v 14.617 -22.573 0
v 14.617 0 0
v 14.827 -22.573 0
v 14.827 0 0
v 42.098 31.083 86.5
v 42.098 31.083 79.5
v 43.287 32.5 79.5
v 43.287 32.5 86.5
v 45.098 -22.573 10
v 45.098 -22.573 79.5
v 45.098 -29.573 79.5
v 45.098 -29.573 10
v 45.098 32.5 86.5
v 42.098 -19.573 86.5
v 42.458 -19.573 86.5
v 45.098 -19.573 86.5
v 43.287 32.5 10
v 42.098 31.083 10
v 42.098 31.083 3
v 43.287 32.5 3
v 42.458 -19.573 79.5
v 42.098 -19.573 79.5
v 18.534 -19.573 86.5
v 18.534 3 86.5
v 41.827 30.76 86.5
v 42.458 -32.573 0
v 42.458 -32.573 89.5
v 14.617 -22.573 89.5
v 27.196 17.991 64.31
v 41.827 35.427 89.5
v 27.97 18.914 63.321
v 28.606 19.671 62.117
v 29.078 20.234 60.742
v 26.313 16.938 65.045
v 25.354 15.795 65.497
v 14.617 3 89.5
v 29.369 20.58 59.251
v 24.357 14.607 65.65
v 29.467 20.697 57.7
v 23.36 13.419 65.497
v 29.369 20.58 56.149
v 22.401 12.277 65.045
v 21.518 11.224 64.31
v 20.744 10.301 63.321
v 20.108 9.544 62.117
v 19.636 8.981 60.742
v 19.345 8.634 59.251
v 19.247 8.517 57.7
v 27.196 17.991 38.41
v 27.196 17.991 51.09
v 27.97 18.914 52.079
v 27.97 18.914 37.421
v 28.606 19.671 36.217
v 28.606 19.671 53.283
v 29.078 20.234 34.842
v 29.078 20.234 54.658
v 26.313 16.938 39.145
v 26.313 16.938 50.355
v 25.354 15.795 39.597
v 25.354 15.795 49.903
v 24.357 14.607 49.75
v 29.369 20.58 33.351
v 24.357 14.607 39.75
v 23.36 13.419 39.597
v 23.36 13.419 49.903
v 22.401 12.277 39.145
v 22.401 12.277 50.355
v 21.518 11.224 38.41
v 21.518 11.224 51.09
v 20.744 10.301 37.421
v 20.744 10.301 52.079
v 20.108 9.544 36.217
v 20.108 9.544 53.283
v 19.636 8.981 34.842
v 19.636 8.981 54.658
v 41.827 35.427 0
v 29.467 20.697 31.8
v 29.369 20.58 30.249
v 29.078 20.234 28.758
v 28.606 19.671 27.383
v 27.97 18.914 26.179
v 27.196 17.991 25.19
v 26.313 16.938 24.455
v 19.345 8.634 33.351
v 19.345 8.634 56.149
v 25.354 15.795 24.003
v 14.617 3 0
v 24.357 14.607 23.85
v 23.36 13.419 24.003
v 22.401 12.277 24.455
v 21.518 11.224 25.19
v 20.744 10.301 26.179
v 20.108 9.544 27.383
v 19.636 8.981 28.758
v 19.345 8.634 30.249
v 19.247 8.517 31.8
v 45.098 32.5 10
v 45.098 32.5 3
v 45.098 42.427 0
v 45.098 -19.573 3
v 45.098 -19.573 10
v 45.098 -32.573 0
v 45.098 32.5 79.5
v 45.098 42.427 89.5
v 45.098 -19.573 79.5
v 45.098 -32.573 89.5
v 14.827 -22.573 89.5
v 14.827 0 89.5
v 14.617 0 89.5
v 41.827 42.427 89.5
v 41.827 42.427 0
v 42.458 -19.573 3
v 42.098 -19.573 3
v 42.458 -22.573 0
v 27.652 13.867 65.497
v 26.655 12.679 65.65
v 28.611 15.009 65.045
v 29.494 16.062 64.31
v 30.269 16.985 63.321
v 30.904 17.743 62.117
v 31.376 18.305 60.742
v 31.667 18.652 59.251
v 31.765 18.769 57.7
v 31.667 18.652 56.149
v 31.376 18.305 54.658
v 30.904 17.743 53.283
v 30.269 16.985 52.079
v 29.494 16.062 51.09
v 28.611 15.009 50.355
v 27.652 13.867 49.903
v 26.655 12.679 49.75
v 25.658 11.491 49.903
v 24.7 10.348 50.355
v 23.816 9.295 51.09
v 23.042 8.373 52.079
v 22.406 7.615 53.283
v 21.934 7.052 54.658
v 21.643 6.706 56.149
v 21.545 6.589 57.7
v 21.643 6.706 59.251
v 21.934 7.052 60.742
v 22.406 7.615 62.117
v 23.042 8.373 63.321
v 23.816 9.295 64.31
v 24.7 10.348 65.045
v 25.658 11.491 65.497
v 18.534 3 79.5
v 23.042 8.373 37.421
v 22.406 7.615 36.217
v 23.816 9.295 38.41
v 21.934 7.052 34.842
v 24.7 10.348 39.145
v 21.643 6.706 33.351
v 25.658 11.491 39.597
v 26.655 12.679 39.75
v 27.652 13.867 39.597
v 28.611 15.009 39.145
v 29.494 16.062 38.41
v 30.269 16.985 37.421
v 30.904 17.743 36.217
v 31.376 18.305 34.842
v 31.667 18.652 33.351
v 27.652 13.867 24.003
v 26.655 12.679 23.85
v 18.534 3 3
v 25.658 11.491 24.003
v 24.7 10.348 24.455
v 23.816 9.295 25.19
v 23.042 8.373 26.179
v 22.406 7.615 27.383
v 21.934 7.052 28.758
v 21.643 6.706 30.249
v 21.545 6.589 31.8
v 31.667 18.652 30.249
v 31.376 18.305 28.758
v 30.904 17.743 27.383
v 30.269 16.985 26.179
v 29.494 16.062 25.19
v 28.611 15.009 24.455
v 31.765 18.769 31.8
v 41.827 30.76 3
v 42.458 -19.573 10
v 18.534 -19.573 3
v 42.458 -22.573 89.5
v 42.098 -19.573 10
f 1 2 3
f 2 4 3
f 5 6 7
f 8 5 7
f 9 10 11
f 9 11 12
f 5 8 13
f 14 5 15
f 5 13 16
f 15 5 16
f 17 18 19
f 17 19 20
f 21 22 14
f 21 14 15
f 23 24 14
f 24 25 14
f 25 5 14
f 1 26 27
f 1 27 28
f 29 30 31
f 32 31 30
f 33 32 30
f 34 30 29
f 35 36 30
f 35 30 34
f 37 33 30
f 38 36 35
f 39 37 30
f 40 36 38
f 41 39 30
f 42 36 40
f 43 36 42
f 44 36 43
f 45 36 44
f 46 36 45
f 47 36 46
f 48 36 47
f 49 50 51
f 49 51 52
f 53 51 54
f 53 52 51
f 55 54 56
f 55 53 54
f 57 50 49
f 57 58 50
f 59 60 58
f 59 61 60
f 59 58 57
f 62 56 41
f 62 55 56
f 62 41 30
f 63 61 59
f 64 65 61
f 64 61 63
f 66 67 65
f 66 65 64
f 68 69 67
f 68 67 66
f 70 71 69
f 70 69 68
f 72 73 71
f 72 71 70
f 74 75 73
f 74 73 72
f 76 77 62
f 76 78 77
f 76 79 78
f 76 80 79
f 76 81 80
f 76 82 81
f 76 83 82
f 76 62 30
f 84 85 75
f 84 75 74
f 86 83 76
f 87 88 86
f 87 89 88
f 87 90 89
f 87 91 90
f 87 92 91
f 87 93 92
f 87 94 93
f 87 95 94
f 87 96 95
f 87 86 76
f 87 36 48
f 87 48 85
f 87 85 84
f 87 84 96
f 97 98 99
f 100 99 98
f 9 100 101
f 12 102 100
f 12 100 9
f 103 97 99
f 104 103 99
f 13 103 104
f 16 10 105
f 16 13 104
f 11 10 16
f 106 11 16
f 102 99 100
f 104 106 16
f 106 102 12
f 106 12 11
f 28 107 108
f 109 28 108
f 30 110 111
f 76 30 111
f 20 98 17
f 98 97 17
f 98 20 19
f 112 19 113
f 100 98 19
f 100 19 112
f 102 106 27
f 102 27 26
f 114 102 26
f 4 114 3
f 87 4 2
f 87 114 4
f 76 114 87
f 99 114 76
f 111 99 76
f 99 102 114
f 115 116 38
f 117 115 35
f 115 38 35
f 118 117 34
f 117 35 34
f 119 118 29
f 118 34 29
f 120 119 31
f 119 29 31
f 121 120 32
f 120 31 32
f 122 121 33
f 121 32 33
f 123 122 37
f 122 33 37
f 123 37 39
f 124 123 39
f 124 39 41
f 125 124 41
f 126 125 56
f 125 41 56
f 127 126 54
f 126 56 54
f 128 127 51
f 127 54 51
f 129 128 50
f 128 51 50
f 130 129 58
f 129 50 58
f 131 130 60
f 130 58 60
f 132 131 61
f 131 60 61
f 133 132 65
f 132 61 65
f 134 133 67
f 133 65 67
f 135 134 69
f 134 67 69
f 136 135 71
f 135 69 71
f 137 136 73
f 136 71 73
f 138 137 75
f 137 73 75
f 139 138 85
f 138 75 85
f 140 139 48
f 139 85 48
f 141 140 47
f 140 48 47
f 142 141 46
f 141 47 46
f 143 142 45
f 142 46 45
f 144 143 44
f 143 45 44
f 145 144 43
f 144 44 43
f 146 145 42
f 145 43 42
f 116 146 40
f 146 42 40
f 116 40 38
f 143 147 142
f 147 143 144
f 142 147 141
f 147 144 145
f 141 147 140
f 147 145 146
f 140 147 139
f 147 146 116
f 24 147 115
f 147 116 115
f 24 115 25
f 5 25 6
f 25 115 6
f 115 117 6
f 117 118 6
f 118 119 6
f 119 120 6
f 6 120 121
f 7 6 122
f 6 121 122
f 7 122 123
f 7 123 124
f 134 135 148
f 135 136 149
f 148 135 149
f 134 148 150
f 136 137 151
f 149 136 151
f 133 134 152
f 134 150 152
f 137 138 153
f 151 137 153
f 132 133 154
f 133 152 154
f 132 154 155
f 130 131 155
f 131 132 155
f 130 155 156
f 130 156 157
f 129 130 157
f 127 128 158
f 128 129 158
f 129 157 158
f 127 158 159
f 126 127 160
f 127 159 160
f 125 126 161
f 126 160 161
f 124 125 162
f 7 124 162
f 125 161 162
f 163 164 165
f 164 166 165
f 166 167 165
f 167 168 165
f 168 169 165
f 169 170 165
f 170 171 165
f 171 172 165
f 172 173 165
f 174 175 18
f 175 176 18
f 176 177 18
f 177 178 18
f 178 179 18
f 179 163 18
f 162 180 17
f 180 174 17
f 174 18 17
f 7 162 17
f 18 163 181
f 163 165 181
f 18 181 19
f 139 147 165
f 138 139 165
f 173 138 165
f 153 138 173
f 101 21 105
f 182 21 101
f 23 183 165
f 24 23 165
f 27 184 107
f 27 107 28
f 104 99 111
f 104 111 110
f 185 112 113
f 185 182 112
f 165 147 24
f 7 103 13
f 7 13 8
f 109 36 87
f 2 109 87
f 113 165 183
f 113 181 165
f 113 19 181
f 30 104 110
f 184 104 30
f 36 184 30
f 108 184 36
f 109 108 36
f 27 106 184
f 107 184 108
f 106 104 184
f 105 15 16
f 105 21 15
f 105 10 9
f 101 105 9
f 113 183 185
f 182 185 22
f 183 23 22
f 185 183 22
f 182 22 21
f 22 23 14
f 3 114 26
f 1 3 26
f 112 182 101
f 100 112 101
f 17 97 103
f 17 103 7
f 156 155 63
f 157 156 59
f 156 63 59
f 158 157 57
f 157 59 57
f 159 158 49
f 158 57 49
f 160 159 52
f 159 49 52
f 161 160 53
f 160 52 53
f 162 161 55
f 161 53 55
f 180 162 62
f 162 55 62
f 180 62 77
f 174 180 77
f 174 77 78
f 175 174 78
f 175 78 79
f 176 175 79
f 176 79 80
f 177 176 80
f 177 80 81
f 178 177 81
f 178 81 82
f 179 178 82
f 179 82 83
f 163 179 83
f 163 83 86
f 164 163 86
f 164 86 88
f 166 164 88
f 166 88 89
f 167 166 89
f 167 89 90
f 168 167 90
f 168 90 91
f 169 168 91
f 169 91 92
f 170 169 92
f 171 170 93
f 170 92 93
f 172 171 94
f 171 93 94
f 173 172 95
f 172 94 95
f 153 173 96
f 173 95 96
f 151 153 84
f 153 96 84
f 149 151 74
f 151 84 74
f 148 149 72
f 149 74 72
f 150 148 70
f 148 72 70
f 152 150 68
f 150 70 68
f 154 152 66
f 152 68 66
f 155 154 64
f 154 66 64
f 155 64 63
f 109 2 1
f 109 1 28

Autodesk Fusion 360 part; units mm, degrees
sketch "Boceto1" plane through (0, 0, 0) normal (0, 1, 0) x (1, 0, 0)
  line L0 (0, 0) -> (45.0979, 0)
  line L1 (45.0979, 0) -> (45.0979, -89.5)
  line L2 (45.0979, -89.5) -> (0, -89.5)
  line L3 (0, -89.5) -> (0, 0)
  dimension "d1" = 89.5
extrude "Extruir1" add sketch "Boceto1" along normal blind 3
sketch "Boceto2" plane through (0, 0, 0) normal (0, -1, 0) x (1, 0, 0)
  line L0 (45.0979, 89.5) -> (0, 89.5)
  line L1 (0, 89.5) -> (0, 0)
  line L2 (0, 0) -> (45.0979, 0)
  line L3 (45.0979, 0) -> (45.0979, 89.5)
  line L4 (0, 0) -> (12.1, 0)
  line L5 (12.1, 89.5) -> (0, 89.5)
  line L6 (0, 89.5) -> (0, 0)
  point P0 (12.1, 0)
  point P1 (12.1, 89.5)
ref_plane "PlanoDeObra1" through (12.1, 0, 44.75) normal (-0.7071, 0.7071, 0) x (0, 0, -1)
sketch "Boceto3" plane through (45.0979, 0, 0) normal (1, 0, 0) x (0, 0, -1)
  line L0 (-89.5, 0) -> (0, 0)
  line L1 (0, 0) -> (0, 3)
  line L2 (0, 3) -> (-89.5, 3)
  line L3 (-89.5, 3) -> (-89.5, 0)
  line L4 (0, 0) -> (-89.5, 0)
  line L5 (-89.5, 0) -> (-89.5, 35.5)
  line L6 (-89.5, 35.5) -> (0, 35.5)
  line L7 (0, 35.5) -> (0, 0)
  line L8 (-86.5, 3) -> (-86.5, 32.5)
  line L9 (-86.5, 32.5) -> (-3, 32.5)
  line L10 (-3, 32.5) -> (-3, 3)
  line L11 (-3, 3) -> (-86.5, 3)
  dimension "d6" = 89.5
  dimension "d7" = 35.5
  dimension "d8" = 3
extrude "Extruir2" add sketch "Boceto3" against normal blind 3 contours L2 L5 L6 L7 L8 L9 L10
sketch "Boceto4" plane through (6.05, -6.05, 0) normal (-0.7071, 0.7071, 0) x (0, 0, -1)
ref_plane "PlanoDeObra2" through (12.1, 0, 44.75) normal (-0.766, 0.6428, 0) x (0, 0, -1)
sketch "Boceto5" plane through (7.1006, -5.9581, 0) normal (-0.766, 0.6428, 0) x (0, 0, -1)
  line L0 (-89.5, -7.7775) -> (0, -7.7775)
  line L1 (0, -7.7775) -> (0, -54.0244)
  line L2 (0, -54.0244) -> (-89.5, -54.0244)
  line L3 (-89.5, -54.0244) -> (-89.5, -7.7775)
  dimension "d12" = 89.5
extrude "Extruir3" add sketch "Boceto5" against normal blind 3
extrude "Extruir4" cut sketch "Boceto2" along normal blind 3
sketch "Boceto6" plane through (7.1006, -5.9581, 0) normal (-0.766, 0.6428, 0) x (0, 0, 1)
  line L0 (0, 11.694) -> (89.5, 11.694)
  line L1 (89.5, 11.694) -> (89.5, 54.0244)
  line L2 (89.5, 54.0244) -> (0, 54.0244)
  line L3 (0, 54.0244) -> (0, 11.694)
  circle A0 centre (57.7, 26.8462) radius 7.95
  circle A1 centre (31.8, 26.8462) radius 7.95
  dimension "d18" = 15.9
  dimension "d19" = 25.9
  dimension "d20" = 15.9
extrude "Extruir5" cut sketch "Boceto6" against normal blind 3 contours A0 | A1
sketch "Boceto7" plane through (0, 3, 0) normal (0, 1, 0) x (-1, 0, 0)
  line L0 (-14.6173, 89.5) -> (-14.6173, 0)
  line L1 (-14.6173, 0) -> (0, 0)
  line L2 (0, 0) -> (0, 89.5)
  line L3 (0, 89.5) -> (-14.6173, 89.5)
  circle A0 centre (-8, 5) radius 3.25
  circle A1 centre (-7.3086, 84.9016) radius 3.25
  dimension "d23" = 6.5
  dimension "d24" = 6.5
extrude "Extruir6" cut sketch "Boceto7" against normal blind 3 contours A0 | A1
sketch "Boceto8" plane through (0, 0, 89.5) normal (0, 0, 1) x (1, 0, 0)
  line L0 (18.5335, 3) -> (42.0979, 31.083)
  line L1 (42.0979, 31.083) -> (42.0979, 3)
  line L2 (42.0979, 3) -> (18.5335, 3)
  line L3 (12.1, 0) -> (16.0162, 0)
  line L4 (16.0162, 0) -> (45.0979, 0)
  line L5 (45.0979, 0) -> (45.0979, 35.5)
  line L6 (45.0979, 35.5) -> (42.0979, 35.5)
  line L7 (42.0979, 35.5) -> (42.0979, 35.1995)
  line L8 (42.0979, 35.1995) -> (41.8268, 35.427)
  line L9 (41.8268, 35.427) -> (14.6173, 3)
  line L10 (14.6173, 3) -> (0, 3)
  line L11 (0, 3) -> (0, 0)
  line L12 (0, 0) -> (12.1, 0)
  line L13 (18.5335, 3) -> (42.0979, 3)
  line L14 (42.0979, 31.083) -> (18.5335, 3)
extrude "Extruir7" add sketch "Boceto8" against normal blind 3 contours L0 L1 L2 L13 L14
sketch "Boceto9" plane through (0, 0, 0) normal (0, 0, -1) x (-1, 0, 0)
  line L0 (-16.0162, 0) -> (-12.1, 0)
  line L1 (-12.1, 0) -> (0, 0)
  line L2 (0, 0) -> (0, 3)
  line L3 (0, 3) -> (-14.6173, 3)
  line L4 (-14.6173, 3) -> (-41.8268, 35.427)
  line L5 (-41.8268, 35.427) -> (-42.0979, 35.1995)
  line L6 (-42.0979, 35.1995) -> (-42.0979, 35.5)
  line L7 (-42.0979, 35.5) -> (-45.0979, 35.5)
  line L8 (-45.0979, 35.5) -> (-45.0979, 0)
  line L9 (-45.0979, 0) -> (-16.0162, 0)
  line L10 (-18.5335, 3) -> (-42.0979, 3)
  line L11 (-42.0979, 3) -> (-42.0979, 31.083)
  line L12 (-42.0979, 31.083) -> (-18.5335, 3)
  line L13 (-42.0979, 3) -> (-18.5335, 3)
  line L14 (-42.0979, 31.083) -> (-42.0979, 3)
extrude "Extruir8" add sketch "Boceto9" against normal blind 3 contours L10 L11 L12 L13 L14
sketch "Boceto10" plane through (45.0979, 0, 0) normal (1, 0, 0) x (0, 0, -1)
  line L0 (-3, 3) -> (-86.5, 3)
  line L1 (-86.5, 3) -> (-86.5, 32.5)
  line L2 (-86.5, 32.5) -> (-3, 32.5)
  line L3 (-3, 32.5) -> (-3, 3)
  line L4 (0, 0) -> (0, 35.5)
  line L5 (0, 35.5) -> (-89.5, 35.5)
  line L6 (-89.5, 35.5) -> (-89.5, 0)
  line L7 (-89.5, 0) -> (0, 0)
  line L8 (0, 34) -> (-89.5, 34)
  line L9 (-89.5, 34) -> (-89.5, 49.617)
  line L10 (-89.5, 49.617) -> (0, 49.617)
  line L11 (0, 49.617) -> (0, 34)
  dimension "d31" = 89.5
  dimension "d32" = 15.617
extrude "Extruir9" add sketch "Boceto10" against normal blind 3.271 contours L4 L5 L6 L8 L9 L11 | L5 L9 L10 L11
sketch "Boceto11" plane through (41.8269, 0, 0) normal (-1, 0, 0) x (0, 0, 1)
  line L0 (0, 35.4269) -> (89.5, 35.4269)
  line L1 (89.5, 35.4269) -> (89.5, 49.617)
  line L2 (89.5, 49.617) -> (0, 49.617)
  line L3 (0, 49.617) -> (0, 35.4269)
  circle A0 centre (82, 43) radius 3.25
  circle A1 centre (10, 43) radius 3.25
  dimension "d35" = 6.5
  dimension "d36" = 6.5
extrude "Extruir10" cut sketch "Boceto11" against normal blind 3.271 contours A0 | A1
extrude "Extruir11" cut 1 faces at (41.8269, 42.6813, 2.25) along direction (1, 0, 0) blind 3
extrude "Extruir12" cut 1 faces at (44.8269, 42.6813, 2.25) along direction (1, 0, 0) blind 1
sketch "Boceto12" plane through (45.0979, 0, 0) normal (1, 0, 0) x (0, 0, -1)
  line L0 (-3, 3) -> (-86.5, 3)
  line L1 (-86.5, 3) -> (-86.5, 32.5)
  line L2 (-86.5, 32.5) -> (-3, 32.5)
  line L3 (-3, 32.5) -> (-3, 3)
  line L4 (0, 35.4269) -> (-89.5, 35.4269)
  line L5 (-89.5, 35.4269) -> (-89.5, 0)
  line L6 (-89.5, 0) -> (0, 0)
  line L7 (0, 0) -> (0, 35.4269)
  line L8 (0, 35.4269) -> (0, 42.4269)
  line L9 (0, 42.4269) -> (-10, 42.4269)
  line L10 (-10, 42.4269) -> (-10, -32.5731)
  line L11 (-10, -32.5731) -> (0, -32.5731)
  line L12 (0, -32.5731) -> (0, 42.4269)
  dimension "d43" = 7
  dimension "d44" = 10
  dimension "d45" = 75
extrude "Extruir13" add sketch "Boceto12" against normal blind 3.271 contours L0 L2 L3 L4 L6 L7 L10 L12 | L0 L2 L3 L10 | L6 L10 L11 L12 | L4 L8 L9 L10 L12
sketch "Boceto13" plane through (45.0979, 0, 0) normal (1, 0, 0) x (0, 0, -1)
  line L0 (-10, 3) -> (-86.5, 3)
  line L1 (-86.5, 3) -> (-86.5, 32.5)
  line L2 (-86.5, 32.5) -> (-10, 32.5)
  line L3 (-10, 32.5) -> (-10, 3)
  line L4 (0, -32.5731) -> (0, 42.4269)
  line L5 (0, 42.4269) -> (-10, 42.4269)
  line L6 (-10, 42.4269) -> (-10, 35.4269)
  line L7 (-10, 35.4269) -> (-89.5, 35.4269)
  line L8 (-89.5, 35.4269) -> (-89.5, 0)
  line L9 (-89.5, 0) -> (-10, 0)
  line L10 (-10, 0) -> (-10, -32.5731)
  line L11 (-10, -32.5731) -> (0, -32.5731)
  line L12 (-89.5, 35.4269) -> (-89.5, 42.4269)
  line L13 (-89.5, 42.4269) -> (-79.5, 42.4269)
  line L14 (-79.5, 42.4269) -> (-79.5, -32.5731)
  line L15 (-79.5, -32.5731) -> (-89.5, -32.5731)
  line L16 (-89.5, -32.5731) -> (-89.5, 42.4269)
  dimension "d48" = 7
  dimension "d49" = 10
  dimension "d50" = 75
extrude "Extruir14" add sketch "Boceto13" against normal blind 3.271 contours L0 L1 L2 L7 L8 L9 L14 L16 | L0 L1 L2 L14 | L9 L14 L15 L16 | L7 L12 L13 L14 L16
sketch "Boceto14" plane through (45.0979, 0, 0) normal (1, 0, 0) x (0, 0, -1)
  line L0 (-79.5, 0) -> (-10, 0)
  line L1 (-10, 0) -> (-10, -32.5731)
  line L2 (-10, -32.5731) -> (0, -32.5731)
  line L3 (0, -32.5731) -> (0, 42.4269)
  line L4 (0, 42.4269) -> (-10, 42.4269)
  line L5 (-10, 42.4269) -> (-10, 35.4269)
  line L6 (-10, 35.4269) -> (-79.5, 35.4269)
  line L7 (-79.5, 35.4269) -> (-79.5, 42.4269)
  line L8 (-79.5, 42.4269) -> (-89.5, 42.4269)
  line L9 (-89.5, 42.4269) -> (-89.5, -32.5731)
  line L10 (-89.5, -32.5731) -> (-79.5, -32.5731)
  line L11 (-79.5, -32.5731) -> (-79.5, 0)
  line L12 (-79.5, 3) -> (-79.5, 32.5)
  line L13 (-79.5, 32.5) -> (-10, 32.5)
  line L14 (-10, 32.5) -> (-10, 3)
  line L15 (-10, 3) -> (-79.5, 3)
  line L16 (0, -32.5731) -> (-89.5, -32.5731)
  line L17 (-89.5, -32.5731) -> (-89.5, -22.5731)
  line L18 (-89.5, -22.5731) -> (0, -22.5731)
  line L19 (0, -22.5731) -> (0, -32.5731)
  line L20 (-89.5, 42.4269) -> (0, 42.4269)
  line L21 (0, 42.4269) -> (0, 35.4269)
  line L22 (0, 35.4269) -> (-89.5, 35.4269)
  line L23 (-89.5, 35.4269) -> (-89.5, 42.4269)
  dimension "d53" = 10
extrude "Extruir15" add sketch "Boceto14" against normal blind 3.271 contours L1 L11 L16 L18 | L5 L6 L7 L20 L22
sketch "Boceto15" plane through (0, 3, 0) normal (0, 1, 0) x (-1, 0, 0)
  circle A0 centre (-7.3086, 84.9016) radius 3.25
  circle A1 centre (-8, 5) radius 3.25
  line L0 (-14.6173, 89.5) -> (-14.6173, 0)
  line L1 (-14.6173, 0) -> (0, 0)
  line L2 (0, 0) -> (0, 89.5)
  line L3 (0, 89.5) -> (-14.6173, 89.5)
  line L4 (0, 0) -> (-14.6173, 0)
  line L5 (-14.6173, 0) -> (-14.6173, 89.5)
  line L6 (-14.6173, 89.5) -> (0, 89.5)
  line L7 (0, 89.5) -> (0, 0)
extrude "Extruir16" cut sketch "Boceto15" against normal blind 3.271
extrude "Extruir17" add 1 faces at (41.8269, -29.2397, 33.1667) along direction (-1, 0, 0) blind 27
sketch "Boceto16" plane through (14.8269, 0, 0) normal (-1, 0, 0) x (0, 0, 1)
  line L0 (10, 0) -> (0, 0)
  line L1 (0, 0) -> (0, -32.5731)
  line L2 (0, -32.5731) -> (89.5, -32.5731)
  line L3 (89.5, -32.5731) -> (89.5, 0)
  line L4 (89.5, 0) -> (79.5, 0)
  line L5 (79.5, 0) -> (79.5, -22.5731)
  line L6 (79.5, -22.5731) -> (10, -22.5731)
  line L7 (10, -22.5731) -> (10, 0)
  line L8 (10, -22.5731) -> (79.5, -22.5731)
  line L9 (79.5, -22.5731) -> (79.5, 0)
  line L10 (79.5, 0) -> (10, 0)
  line L11 (10, 0) -> (10, -22.5731)
extrude "Extruir18" add sketch "Boceto16" against normal blind 3 contours L5 L6 L7 L8 L9 L10 L11
extrude "Extruir19" cut 1 faces at (36.0076, -22.5731, 56.3333) along direction (0, -1, 0) blind 7
extrude "Extruir20" cut 1 faces at (36.0076, 0, 33.1667) along direction (0, 1, 0) blind 3
extrude "Extruir21" cut 1 faces at (34.9173, -18.7154, 10) along direction (0, 0, -1) blind 7
extrude "Extruir22" cut 1 faces at (34.9173, -18.7154, 79.5) along direction (0, 0, 1) blind 7
sketch "Boceto17" plane through (45.0979, 0, 0) normal (1, 0, 0) x (0, 0, -1)
  line L0 (-89.5, -32.5731) -> (0, -32.5731)
  line L1 (0, -32.5731) -> (0, 42.4269)
  line L2 (0, 42.4269) -> (-89.5, 42.4269)
  line L3 (-89.5, 42.4269) -> (-89.5, -32.5731)
  line L4 (-3, -29.5731) -> (-86.5, -29.5731)
  line L5 (-86.5, -29.5731) -> (-86.5, 32.5)
  line L6 (-86.5, 32.5) -> (-3, 32.5)
  line L7 (-3, 32.5) -> (-3, -29.5731)
  line L8 (0, 42.4269) -> (-10, 42.4269)
  line L9 (-10, 42.4269) -> (-10, -32.5731)
  line L10 (-10, -32.5731) -> (0, -32.5731)
  line L11 (0, -32.5731) -> (0, 42.4269)
  line L12 (-89.5, 42.4269) -> (-79.5, 42.4269)
  line L13 (-79.5, 42.4269) -> (-79.5, -32.5731)
  line L14 (-79.5, -32.5731) -> (-89.5, -32.5731)
  line L15 (-89.5, -32.5731) -> (-89.5, 42.4269)
  dimension "d70" = 10
  dimension "d71" = 75
  dimension "d72" = 10
  dimension "d73" = 75
extrude "Extruir23" add sketch "Boceto17" against normal blind 3 contours L0 L2 L3 L4 L5 L6 L12 L13 L14 L15 | L0 L1 L2 L4 L6 L7 L8 L9 L10 L11 | L4 L5 L6 L13 | L4 L6 L7 L9
extrude "Extruir24" add 1 faces at (17.8269, -18.7154, 58.6667) along direction (1, 0, 0) blind 0.707
extrude "Extruir25" add 1 faces at (14.8269, -10.8577, 59.6667) along direction (-1, 0, 0) blind 0.21
sketch "Boceto18" plane through (45.0979, 0, 0) normal (1, 0, 0) x (0, 0, -1)
  line L0 (-79.5, 32.5) -> (-10, 32.5)
  line L1 (-10, 32.5) -> (-10, -29.5731)
  line L2 (-10, -29.5731) -> (-79.5, -29.5731)
  line L3 (-79.5, -29.5731) -> (-79.5, 32.5)
  line L4 (0, 42.4269) -> (-89.5, 42.4269)
  line L5 (-89.5, 42.4269) -> (-89.5, -32.5731)
  line L6 (-89.5, -32.5731) -> (0, -32.5731)
  line L7 (0, -32.5731) -> (0, 42.4269)
  line L8 (-89.5, -32.5731) -> (0, -32.5731)
  line L9 (0, -32.5731) -> (0, -22.5731)
  line L10 (0, -22.5731) -> (-89.5, -22.5731)
  line L11 (-89.5, -22.5731) -> (-89.5, -32.5731)
  dimension "d80" = 89.5
  dimension "d81" = 10
extrude "Extruir26" add sketch "Boceto18" against normal blind 3 contours L1 L2 L3 L10
sketch "Boceto19" plane through (14.6169, 0, 0) normal (-1, 0, 0) x (0, 0, 1)
  line L0 (89.5, 0) -> (0, 0)
  line L1 (0, 0) -> (0, -32.5731)
  line L2 (0, -32.5731) -> (89.5, -32.5731)
  line L3 (89.5, -32.5731) -> (89.5, 0)
  line L4 (0, -32.5731) -> (89.5, -32.5731)
  line L5 (89.5, -32.5731) -> (89.5, -22.5731)
  line L6 (89.5, -22.5731) -> (0, -22.5731)
  line L7 (0, -22.5731) -> (0, -32.5731)
  dimension "d84" = 89.5
  dimension "d85" = 10
extrude "Extruir27" cut sketch "Boceto19" against normal blind 27.841 contours L1 L2 L3 L4 L5 L6 L7
sketch "Boceto20" plane through (0, -22.5731, 0) normal (0, -1, 0) x (1, 0, 0)
  line L0 (42.0979, 79.5) -> (42.4579, 79.5)
  line L1 (42.4579, 79.5) -> (42.4579, 89.5)
  line L2 (42.4579, 89.5) -> (14.6169, 89.5)
  line L3 (14.6169, 89.5) -> (14.6169, 0)
  line L4 (14.6169, 0) -> (42.4579, 0)
  line L5 (42.4579, 0) -> (42.4579, 10)
  line L6 (42.4579, 10) -> (42.0979, 10)
  line L7 (42.0979, 10) -> (42.0979, 3)
  line L8 (42.0979, 3) -> (18.5339, 3)
  line L9 (18.5339, 3) -> (18.5339, 86.5)
  line L10 (18.5339, 86.5) -> (42.0979, 86.5)
  line L11 (42.0979, 86.5) -> (42.0979, 79.5)
  line L12 (42.4579, 0) -> (18.5339, 0)
  line L13 (18.5339, 0) -> (18.5339, 86.5)
  line L14 (18.5339, 86.5) -> (42.4579, 86.5)
  line L15 (42.4579, 86.5) -> (42.4579, 0)
  line L16 (42.4579, 0) -> (18.5339, 0)
  line L17 (18.5339, 0) -> (18.5339, 86.5)
  line L18 (18.5339, 86.5) -> (42.4579, 86.5)
  line L19 (42.4579, 86.5) -> (42.4579, 0)
extrude "Extruir28" add sketch "Boceto20" against normal blind 3 contours L0 L6 L7 L8 L9 L10 L11 L13 L14 L15 L17 L18 L19
extrude "Extruir29" add 1 faces at (42.4579, -21.5731, 56.3333) along direction (1, 0, 0) blind 2.64
extrude "Extruir30" cut 1 faces at (44.0979, 14.67, 10) along direction (0, 0, -1) blind 7
extrude "Extruir31" cut 1 faces at (44.0979, 14.67, 79.5) along direction (0, 0, 1) blind 7
sketch "Boceto21" plane through (0, 0, 0) normal (0, 0, -1) x (-1, 0, 0)
  line L0 (-42.4579, -32.5731) -> (-42.4579, -22.5731)
  line L1 (-42.4579, -22.5731) -> (-14.6169, -22.5731)
  line L2 (-14.6169, -22.5731) -> (-14.6169, 0)
  line L3 (-14.6169, 0) -> (-14.6173, 0)
  line L4 (-14.6173, 0) -> (-14.6173, 3)
  line L5 (-14.6173, 3) -> (-41.8268, 35.427)
  line L6 (-41.8268, 35.427) -> (-41.8269, 35.4269)
  line L7 (-41.8269, 35.4269) -> (-41.8269, 42.4269)
  line L8 (-41.8269, 42.4269) -> (-45.0979, 42.4269)
  line L9 (-45.0979, 42.4269) -> (-45.0979, -32.5731)
  line L10 (-45.0979, -32.5731) -> (-42.4579, -32.5731)
  line L11 (-42.4579, -32.5731) -> (-14.6169, -22.5731)
  line L12 (-42.4579, -22.5731) -> (-42.4579, -32.5731)
extrude "Extruir32" add sketch "Boceto21" against normal blind 89.5 contours L0 L1 L11 L12
equation "d18 = 7.95 mm + 7.95 mm"
equation "d19 = 7.95 mm + 10 mm + 7.95 mm"
equation "d32 = 14.617 mm + 1 mm"
